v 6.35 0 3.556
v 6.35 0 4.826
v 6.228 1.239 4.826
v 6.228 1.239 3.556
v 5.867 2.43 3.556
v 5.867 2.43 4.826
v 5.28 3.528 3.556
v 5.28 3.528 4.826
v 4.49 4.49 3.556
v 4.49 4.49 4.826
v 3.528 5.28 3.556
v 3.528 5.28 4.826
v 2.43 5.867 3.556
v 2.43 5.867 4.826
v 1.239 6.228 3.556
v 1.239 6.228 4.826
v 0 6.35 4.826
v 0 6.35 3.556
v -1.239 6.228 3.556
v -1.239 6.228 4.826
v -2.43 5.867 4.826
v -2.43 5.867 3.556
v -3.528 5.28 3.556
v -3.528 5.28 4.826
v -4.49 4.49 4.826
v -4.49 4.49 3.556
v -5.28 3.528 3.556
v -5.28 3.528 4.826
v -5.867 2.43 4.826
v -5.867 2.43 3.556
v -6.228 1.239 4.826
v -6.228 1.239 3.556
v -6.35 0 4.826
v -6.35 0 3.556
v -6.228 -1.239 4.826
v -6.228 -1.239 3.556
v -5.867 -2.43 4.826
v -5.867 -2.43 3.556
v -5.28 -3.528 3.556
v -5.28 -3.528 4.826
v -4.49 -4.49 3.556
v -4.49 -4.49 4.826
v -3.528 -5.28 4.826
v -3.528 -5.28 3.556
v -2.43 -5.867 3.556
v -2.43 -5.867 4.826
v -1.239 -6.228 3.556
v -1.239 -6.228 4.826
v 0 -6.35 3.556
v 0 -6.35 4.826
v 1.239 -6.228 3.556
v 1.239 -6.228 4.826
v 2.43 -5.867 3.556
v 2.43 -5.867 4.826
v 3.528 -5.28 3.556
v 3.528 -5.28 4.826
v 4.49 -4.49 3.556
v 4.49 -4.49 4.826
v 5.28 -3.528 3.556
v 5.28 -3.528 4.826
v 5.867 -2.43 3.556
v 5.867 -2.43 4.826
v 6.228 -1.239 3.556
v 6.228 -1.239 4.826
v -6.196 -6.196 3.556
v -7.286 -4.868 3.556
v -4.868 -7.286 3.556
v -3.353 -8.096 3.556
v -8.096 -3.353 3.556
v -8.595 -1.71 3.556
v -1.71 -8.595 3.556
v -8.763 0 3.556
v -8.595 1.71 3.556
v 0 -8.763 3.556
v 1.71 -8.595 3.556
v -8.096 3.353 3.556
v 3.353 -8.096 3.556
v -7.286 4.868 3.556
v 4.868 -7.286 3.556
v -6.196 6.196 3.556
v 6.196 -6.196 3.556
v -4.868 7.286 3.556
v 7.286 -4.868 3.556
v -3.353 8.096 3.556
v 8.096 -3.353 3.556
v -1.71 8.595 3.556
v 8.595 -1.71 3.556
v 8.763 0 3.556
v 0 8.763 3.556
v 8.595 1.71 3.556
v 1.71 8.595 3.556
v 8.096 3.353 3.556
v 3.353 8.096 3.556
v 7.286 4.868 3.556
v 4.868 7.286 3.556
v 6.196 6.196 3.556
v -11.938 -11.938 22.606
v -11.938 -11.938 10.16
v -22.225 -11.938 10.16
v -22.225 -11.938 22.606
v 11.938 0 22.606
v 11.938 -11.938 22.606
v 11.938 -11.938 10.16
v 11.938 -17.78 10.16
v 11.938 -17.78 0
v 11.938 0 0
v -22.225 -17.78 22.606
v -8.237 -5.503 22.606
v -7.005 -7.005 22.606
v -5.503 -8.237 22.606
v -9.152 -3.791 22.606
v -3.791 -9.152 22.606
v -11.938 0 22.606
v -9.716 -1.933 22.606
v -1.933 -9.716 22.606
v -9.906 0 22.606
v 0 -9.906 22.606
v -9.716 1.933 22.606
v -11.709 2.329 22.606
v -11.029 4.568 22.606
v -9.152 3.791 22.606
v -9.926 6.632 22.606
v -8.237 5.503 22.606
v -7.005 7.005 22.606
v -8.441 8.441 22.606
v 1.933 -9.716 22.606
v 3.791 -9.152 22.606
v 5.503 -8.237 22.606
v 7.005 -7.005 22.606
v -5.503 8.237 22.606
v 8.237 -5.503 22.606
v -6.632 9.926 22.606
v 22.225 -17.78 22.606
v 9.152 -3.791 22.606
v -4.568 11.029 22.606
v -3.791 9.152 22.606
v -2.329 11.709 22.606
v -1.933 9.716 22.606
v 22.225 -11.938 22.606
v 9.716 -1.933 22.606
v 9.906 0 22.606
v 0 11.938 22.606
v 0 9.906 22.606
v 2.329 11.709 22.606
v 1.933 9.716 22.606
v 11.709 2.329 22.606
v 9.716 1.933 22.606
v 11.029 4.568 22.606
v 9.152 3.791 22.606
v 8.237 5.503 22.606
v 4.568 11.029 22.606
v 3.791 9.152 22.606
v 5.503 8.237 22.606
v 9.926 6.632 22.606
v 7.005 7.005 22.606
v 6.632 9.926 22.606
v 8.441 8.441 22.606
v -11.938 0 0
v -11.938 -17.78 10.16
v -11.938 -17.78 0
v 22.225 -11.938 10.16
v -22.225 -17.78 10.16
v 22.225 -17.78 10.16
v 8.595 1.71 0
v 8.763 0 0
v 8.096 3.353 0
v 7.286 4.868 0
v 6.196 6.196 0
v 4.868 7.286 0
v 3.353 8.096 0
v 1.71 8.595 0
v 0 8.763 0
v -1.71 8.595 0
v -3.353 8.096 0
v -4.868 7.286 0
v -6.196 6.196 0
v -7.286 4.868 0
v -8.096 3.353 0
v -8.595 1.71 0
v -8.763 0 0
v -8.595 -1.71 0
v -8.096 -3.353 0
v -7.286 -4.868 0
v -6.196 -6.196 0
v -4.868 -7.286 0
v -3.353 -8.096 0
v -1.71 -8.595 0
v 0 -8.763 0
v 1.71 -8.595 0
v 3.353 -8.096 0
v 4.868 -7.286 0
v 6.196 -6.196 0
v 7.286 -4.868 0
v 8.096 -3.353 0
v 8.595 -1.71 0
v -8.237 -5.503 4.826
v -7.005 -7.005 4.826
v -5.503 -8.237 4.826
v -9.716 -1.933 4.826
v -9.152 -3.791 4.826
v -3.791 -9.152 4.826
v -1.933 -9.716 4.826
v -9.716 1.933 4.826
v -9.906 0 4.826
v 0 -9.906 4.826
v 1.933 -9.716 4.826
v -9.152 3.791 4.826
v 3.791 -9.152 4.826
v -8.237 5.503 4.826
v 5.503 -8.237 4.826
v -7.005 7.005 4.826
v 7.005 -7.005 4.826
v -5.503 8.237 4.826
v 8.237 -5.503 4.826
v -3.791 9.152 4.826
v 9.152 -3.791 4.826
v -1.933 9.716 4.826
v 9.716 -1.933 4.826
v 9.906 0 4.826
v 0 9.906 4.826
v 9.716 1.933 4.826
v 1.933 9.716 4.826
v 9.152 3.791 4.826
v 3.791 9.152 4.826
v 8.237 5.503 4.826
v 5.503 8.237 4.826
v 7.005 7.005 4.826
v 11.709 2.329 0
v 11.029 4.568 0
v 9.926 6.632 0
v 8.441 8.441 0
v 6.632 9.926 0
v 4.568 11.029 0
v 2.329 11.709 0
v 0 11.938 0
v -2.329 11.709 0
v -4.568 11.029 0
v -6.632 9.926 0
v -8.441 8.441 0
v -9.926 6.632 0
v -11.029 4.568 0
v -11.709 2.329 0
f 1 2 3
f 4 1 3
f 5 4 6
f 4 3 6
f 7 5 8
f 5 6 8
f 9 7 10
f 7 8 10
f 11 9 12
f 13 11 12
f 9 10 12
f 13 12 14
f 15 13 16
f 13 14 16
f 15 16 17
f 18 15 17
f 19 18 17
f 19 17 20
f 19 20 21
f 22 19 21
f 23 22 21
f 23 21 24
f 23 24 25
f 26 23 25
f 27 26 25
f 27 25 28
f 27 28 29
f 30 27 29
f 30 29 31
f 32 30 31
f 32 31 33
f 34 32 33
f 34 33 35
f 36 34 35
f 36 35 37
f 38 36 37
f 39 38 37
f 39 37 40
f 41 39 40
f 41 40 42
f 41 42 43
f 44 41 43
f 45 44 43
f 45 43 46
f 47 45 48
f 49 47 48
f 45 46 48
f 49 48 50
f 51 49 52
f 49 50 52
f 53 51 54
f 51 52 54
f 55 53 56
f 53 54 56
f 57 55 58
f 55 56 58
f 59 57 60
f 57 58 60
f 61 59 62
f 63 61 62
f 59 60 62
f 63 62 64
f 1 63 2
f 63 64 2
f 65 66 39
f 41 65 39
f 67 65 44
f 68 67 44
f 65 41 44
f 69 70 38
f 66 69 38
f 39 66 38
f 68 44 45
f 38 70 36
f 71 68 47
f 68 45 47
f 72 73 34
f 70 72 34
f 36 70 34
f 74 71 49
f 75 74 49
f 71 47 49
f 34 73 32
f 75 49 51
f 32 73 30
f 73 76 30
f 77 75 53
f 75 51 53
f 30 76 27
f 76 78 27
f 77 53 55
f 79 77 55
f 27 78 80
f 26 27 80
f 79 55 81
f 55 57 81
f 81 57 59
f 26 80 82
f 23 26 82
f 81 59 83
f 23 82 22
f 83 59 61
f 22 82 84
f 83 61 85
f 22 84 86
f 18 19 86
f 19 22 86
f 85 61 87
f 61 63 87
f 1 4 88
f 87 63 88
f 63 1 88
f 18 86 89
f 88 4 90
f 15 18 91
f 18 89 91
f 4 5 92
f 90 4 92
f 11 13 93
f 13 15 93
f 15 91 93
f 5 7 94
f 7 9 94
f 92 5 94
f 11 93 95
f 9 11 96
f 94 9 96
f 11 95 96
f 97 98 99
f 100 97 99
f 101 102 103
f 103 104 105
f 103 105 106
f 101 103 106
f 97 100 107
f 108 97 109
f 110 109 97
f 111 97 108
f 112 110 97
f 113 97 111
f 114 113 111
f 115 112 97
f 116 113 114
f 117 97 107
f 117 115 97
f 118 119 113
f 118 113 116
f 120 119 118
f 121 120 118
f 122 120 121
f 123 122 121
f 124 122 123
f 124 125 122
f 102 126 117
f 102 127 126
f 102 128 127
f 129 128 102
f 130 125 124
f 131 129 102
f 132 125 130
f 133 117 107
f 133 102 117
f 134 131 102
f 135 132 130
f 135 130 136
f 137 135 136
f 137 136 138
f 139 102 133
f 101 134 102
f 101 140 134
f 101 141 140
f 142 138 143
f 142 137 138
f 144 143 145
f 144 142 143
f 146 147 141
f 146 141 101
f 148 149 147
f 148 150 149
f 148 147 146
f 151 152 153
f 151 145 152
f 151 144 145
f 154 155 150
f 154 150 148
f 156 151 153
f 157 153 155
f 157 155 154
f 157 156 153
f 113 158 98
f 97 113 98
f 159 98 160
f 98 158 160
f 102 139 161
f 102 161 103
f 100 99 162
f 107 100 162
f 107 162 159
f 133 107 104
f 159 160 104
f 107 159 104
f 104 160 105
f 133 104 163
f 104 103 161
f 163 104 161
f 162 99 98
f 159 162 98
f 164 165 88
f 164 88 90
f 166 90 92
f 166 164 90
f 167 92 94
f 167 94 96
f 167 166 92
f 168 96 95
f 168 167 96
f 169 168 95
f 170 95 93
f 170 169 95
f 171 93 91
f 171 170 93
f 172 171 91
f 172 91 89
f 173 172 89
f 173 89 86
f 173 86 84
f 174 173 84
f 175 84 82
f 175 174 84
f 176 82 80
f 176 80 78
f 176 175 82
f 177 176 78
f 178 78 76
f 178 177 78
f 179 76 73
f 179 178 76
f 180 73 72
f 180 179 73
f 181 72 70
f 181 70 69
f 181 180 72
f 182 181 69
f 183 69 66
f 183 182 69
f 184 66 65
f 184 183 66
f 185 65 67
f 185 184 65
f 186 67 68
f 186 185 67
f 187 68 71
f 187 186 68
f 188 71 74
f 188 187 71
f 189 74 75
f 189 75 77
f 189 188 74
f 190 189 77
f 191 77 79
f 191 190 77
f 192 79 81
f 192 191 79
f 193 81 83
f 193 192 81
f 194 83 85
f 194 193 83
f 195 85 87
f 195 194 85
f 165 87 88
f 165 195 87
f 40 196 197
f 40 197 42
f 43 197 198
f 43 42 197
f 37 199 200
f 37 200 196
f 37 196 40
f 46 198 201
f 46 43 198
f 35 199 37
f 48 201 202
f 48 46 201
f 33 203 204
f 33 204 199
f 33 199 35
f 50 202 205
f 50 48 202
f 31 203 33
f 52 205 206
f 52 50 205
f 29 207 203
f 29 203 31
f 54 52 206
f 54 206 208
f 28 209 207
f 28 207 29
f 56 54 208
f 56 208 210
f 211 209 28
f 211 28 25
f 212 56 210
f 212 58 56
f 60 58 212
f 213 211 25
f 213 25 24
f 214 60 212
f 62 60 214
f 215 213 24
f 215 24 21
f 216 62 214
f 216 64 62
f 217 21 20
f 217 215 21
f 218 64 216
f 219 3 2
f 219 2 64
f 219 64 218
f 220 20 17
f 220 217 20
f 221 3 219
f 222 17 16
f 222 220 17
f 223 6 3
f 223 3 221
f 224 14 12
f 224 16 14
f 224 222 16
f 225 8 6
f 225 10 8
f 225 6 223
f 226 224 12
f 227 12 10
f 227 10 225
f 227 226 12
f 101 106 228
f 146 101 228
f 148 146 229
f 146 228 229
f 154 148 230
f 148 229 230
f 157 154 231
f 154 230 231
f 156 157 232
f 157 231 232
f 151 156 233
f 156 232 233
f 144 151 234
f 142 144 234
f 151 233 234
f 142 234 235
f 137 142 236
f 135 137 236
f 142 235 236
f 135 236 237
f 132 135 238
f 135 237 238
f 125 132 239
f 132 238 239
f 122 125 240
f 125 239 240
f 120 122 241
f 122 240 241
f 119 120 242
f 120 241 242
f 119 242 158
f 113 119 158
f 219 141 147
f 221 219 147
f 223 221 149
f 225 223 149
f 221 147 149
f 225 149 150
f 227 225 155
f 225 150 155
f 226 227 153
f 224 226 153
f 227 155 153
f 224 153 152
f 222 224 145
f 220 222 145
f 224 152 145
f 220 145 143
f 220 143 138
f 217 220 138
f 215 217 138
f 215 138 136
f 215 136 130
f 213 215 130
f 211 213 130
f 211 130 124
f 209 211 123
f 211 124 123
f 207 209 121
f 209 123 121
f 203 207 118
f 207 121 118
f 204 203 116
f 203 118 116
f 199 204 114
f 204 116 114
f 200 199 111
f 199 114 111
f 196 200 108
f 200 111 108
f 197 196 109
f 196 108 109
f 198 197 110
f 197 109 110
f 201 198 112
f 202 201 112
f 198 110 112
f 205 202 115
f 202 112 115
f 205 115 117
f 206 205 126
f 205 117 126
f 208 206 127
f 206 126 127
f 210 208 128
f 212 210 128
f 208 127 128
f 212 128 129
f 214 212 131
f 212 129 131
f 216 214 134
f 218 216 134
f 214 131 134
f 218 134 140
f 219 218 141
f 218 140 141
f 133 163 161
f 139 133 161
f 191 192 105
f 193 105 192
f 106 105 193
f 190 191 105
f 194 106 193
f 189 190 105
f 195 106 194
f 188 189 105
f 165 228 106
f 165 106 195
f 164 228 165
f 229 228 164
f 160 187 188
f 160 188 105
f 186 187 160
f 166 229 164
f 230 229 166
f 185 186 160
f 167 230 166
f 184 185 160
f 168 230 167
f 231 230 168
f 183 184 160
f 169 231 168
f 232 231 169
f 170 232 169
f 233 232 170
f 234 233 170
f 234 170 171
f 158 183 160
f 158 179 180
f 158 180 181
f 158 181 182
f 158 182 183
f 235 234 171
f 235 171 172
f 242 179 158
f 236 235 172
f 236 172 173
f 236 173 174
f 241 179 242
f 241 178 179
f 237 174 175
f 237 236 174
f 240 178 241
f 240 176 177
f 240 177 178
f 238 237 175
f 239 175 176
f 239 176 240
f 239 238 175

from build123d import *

# Parameters (mm, degrees)
SKETCH1_R           = 8.763
BOSS_EXTRUDE1_DEPTH = 3.556
BOSS_EXTRUDE2_DEPTH = 19.05
SKETCH3_R           = 9.906
CUT_EXTRUDE1_DEPTH  = 17.78
SKETCH4_R           = 6.35
CUT_EXTRUDE2_DEPTH  = 17.78
SKETCH5_W           = 10.287
SKETCH5_H           = 10.16
CUT_EXTRUDE3_DEPTH  = 12.7


with BuildPart() as part:
    # Sketch1 → Boss-Extrude1 (new body)
    with BuildSketch(Plane.XY):
        with BuildLine():
            Line((11.938, 0), (11.938, -11.938))
            Line((11.938, -11.938), (22.225, -11.938))
            Line((22.225, -11.938), (22.225, -17.78))
            Line((22.225, -17.78), (-22.225, -17.78))
            Line((-22.225, -17.78), (-22.225, -11.938))
            Line((-22.225, -11.938), (-11.938, -11.938))
            Line((-11.938, -11.938), (-11.938, 0))
            ThreePointArc((-11.938, 0), (0, 11.938), (11.938, 0))
        make_face()
        Circle(SKETCH1_R, mode=Mode.SUBTRACT)
    extrude(amount=BOSS_EXTRUDE1_DEPTH)

    # Sketch2 → Boss-Extrude2 (add)
    with BuildSketch(Plane.XY.offset(3.556)):
        with BuildLine():
            Line((-11.938, 0), (-11.938, -11.938))
            Line((-11.938, -11.938), (-22.225, -11.938))
            Line((-22.225, -11.938), (-22.225, -17.78))
            Line((-22.225, -17.78), (22.225, -17.78))
            Line((22.225, -17.78), (22.225, -11.938))
            Line((22.225, -11.938), (11.938, -11.938))
            Line((11.938, -11.938), (11.938, 0))
            ThreePointArc((11.938, 0), (0, 11.938), (-11.938, 0))
        make_face()
    extrude(amount=BOSS_EXTRUDE2_DEPTH)

    # Sketch3 → Cut-Extrude1 (cut)
    with BuildSketch(Plane.XY.offset(22.606)):
        Circle(SKETCH3_R)
    extrude(amount=-CUT_EXTRUDE1_DEPTH, mode=Mode.SUBTRACT)

    # Sketch4 → Cut-Extrude2 (cut)
    with BuildSketch(Plane.XY.offset(4.826)):
        Circle(SKETCH4_R)
    extrude(amount=-CUT_EXTRUDE2_DEPTH, mode=Mode.SUBTRACT)

    # Sketch5 → Cut-Extrude3 (cut)
    with BuildSketch(Plane(origin=(0, -11.938, 0), x_dir=(1, 0, 0), z_dir=(0, 1, 0))):
        with Locations((17.0815, -5.08)):
            Rectangle(SKETCH5_W, SKETCH5_H)
        with Locations((-17.0815, -5.08)):
            Rectangle(SKETCH5_W, SKETCH5_H)
    extrude(amount=-CUT_EXTRUDE3_DEPTH, mode=Mode.SUBTRACT)


solid = part.part
